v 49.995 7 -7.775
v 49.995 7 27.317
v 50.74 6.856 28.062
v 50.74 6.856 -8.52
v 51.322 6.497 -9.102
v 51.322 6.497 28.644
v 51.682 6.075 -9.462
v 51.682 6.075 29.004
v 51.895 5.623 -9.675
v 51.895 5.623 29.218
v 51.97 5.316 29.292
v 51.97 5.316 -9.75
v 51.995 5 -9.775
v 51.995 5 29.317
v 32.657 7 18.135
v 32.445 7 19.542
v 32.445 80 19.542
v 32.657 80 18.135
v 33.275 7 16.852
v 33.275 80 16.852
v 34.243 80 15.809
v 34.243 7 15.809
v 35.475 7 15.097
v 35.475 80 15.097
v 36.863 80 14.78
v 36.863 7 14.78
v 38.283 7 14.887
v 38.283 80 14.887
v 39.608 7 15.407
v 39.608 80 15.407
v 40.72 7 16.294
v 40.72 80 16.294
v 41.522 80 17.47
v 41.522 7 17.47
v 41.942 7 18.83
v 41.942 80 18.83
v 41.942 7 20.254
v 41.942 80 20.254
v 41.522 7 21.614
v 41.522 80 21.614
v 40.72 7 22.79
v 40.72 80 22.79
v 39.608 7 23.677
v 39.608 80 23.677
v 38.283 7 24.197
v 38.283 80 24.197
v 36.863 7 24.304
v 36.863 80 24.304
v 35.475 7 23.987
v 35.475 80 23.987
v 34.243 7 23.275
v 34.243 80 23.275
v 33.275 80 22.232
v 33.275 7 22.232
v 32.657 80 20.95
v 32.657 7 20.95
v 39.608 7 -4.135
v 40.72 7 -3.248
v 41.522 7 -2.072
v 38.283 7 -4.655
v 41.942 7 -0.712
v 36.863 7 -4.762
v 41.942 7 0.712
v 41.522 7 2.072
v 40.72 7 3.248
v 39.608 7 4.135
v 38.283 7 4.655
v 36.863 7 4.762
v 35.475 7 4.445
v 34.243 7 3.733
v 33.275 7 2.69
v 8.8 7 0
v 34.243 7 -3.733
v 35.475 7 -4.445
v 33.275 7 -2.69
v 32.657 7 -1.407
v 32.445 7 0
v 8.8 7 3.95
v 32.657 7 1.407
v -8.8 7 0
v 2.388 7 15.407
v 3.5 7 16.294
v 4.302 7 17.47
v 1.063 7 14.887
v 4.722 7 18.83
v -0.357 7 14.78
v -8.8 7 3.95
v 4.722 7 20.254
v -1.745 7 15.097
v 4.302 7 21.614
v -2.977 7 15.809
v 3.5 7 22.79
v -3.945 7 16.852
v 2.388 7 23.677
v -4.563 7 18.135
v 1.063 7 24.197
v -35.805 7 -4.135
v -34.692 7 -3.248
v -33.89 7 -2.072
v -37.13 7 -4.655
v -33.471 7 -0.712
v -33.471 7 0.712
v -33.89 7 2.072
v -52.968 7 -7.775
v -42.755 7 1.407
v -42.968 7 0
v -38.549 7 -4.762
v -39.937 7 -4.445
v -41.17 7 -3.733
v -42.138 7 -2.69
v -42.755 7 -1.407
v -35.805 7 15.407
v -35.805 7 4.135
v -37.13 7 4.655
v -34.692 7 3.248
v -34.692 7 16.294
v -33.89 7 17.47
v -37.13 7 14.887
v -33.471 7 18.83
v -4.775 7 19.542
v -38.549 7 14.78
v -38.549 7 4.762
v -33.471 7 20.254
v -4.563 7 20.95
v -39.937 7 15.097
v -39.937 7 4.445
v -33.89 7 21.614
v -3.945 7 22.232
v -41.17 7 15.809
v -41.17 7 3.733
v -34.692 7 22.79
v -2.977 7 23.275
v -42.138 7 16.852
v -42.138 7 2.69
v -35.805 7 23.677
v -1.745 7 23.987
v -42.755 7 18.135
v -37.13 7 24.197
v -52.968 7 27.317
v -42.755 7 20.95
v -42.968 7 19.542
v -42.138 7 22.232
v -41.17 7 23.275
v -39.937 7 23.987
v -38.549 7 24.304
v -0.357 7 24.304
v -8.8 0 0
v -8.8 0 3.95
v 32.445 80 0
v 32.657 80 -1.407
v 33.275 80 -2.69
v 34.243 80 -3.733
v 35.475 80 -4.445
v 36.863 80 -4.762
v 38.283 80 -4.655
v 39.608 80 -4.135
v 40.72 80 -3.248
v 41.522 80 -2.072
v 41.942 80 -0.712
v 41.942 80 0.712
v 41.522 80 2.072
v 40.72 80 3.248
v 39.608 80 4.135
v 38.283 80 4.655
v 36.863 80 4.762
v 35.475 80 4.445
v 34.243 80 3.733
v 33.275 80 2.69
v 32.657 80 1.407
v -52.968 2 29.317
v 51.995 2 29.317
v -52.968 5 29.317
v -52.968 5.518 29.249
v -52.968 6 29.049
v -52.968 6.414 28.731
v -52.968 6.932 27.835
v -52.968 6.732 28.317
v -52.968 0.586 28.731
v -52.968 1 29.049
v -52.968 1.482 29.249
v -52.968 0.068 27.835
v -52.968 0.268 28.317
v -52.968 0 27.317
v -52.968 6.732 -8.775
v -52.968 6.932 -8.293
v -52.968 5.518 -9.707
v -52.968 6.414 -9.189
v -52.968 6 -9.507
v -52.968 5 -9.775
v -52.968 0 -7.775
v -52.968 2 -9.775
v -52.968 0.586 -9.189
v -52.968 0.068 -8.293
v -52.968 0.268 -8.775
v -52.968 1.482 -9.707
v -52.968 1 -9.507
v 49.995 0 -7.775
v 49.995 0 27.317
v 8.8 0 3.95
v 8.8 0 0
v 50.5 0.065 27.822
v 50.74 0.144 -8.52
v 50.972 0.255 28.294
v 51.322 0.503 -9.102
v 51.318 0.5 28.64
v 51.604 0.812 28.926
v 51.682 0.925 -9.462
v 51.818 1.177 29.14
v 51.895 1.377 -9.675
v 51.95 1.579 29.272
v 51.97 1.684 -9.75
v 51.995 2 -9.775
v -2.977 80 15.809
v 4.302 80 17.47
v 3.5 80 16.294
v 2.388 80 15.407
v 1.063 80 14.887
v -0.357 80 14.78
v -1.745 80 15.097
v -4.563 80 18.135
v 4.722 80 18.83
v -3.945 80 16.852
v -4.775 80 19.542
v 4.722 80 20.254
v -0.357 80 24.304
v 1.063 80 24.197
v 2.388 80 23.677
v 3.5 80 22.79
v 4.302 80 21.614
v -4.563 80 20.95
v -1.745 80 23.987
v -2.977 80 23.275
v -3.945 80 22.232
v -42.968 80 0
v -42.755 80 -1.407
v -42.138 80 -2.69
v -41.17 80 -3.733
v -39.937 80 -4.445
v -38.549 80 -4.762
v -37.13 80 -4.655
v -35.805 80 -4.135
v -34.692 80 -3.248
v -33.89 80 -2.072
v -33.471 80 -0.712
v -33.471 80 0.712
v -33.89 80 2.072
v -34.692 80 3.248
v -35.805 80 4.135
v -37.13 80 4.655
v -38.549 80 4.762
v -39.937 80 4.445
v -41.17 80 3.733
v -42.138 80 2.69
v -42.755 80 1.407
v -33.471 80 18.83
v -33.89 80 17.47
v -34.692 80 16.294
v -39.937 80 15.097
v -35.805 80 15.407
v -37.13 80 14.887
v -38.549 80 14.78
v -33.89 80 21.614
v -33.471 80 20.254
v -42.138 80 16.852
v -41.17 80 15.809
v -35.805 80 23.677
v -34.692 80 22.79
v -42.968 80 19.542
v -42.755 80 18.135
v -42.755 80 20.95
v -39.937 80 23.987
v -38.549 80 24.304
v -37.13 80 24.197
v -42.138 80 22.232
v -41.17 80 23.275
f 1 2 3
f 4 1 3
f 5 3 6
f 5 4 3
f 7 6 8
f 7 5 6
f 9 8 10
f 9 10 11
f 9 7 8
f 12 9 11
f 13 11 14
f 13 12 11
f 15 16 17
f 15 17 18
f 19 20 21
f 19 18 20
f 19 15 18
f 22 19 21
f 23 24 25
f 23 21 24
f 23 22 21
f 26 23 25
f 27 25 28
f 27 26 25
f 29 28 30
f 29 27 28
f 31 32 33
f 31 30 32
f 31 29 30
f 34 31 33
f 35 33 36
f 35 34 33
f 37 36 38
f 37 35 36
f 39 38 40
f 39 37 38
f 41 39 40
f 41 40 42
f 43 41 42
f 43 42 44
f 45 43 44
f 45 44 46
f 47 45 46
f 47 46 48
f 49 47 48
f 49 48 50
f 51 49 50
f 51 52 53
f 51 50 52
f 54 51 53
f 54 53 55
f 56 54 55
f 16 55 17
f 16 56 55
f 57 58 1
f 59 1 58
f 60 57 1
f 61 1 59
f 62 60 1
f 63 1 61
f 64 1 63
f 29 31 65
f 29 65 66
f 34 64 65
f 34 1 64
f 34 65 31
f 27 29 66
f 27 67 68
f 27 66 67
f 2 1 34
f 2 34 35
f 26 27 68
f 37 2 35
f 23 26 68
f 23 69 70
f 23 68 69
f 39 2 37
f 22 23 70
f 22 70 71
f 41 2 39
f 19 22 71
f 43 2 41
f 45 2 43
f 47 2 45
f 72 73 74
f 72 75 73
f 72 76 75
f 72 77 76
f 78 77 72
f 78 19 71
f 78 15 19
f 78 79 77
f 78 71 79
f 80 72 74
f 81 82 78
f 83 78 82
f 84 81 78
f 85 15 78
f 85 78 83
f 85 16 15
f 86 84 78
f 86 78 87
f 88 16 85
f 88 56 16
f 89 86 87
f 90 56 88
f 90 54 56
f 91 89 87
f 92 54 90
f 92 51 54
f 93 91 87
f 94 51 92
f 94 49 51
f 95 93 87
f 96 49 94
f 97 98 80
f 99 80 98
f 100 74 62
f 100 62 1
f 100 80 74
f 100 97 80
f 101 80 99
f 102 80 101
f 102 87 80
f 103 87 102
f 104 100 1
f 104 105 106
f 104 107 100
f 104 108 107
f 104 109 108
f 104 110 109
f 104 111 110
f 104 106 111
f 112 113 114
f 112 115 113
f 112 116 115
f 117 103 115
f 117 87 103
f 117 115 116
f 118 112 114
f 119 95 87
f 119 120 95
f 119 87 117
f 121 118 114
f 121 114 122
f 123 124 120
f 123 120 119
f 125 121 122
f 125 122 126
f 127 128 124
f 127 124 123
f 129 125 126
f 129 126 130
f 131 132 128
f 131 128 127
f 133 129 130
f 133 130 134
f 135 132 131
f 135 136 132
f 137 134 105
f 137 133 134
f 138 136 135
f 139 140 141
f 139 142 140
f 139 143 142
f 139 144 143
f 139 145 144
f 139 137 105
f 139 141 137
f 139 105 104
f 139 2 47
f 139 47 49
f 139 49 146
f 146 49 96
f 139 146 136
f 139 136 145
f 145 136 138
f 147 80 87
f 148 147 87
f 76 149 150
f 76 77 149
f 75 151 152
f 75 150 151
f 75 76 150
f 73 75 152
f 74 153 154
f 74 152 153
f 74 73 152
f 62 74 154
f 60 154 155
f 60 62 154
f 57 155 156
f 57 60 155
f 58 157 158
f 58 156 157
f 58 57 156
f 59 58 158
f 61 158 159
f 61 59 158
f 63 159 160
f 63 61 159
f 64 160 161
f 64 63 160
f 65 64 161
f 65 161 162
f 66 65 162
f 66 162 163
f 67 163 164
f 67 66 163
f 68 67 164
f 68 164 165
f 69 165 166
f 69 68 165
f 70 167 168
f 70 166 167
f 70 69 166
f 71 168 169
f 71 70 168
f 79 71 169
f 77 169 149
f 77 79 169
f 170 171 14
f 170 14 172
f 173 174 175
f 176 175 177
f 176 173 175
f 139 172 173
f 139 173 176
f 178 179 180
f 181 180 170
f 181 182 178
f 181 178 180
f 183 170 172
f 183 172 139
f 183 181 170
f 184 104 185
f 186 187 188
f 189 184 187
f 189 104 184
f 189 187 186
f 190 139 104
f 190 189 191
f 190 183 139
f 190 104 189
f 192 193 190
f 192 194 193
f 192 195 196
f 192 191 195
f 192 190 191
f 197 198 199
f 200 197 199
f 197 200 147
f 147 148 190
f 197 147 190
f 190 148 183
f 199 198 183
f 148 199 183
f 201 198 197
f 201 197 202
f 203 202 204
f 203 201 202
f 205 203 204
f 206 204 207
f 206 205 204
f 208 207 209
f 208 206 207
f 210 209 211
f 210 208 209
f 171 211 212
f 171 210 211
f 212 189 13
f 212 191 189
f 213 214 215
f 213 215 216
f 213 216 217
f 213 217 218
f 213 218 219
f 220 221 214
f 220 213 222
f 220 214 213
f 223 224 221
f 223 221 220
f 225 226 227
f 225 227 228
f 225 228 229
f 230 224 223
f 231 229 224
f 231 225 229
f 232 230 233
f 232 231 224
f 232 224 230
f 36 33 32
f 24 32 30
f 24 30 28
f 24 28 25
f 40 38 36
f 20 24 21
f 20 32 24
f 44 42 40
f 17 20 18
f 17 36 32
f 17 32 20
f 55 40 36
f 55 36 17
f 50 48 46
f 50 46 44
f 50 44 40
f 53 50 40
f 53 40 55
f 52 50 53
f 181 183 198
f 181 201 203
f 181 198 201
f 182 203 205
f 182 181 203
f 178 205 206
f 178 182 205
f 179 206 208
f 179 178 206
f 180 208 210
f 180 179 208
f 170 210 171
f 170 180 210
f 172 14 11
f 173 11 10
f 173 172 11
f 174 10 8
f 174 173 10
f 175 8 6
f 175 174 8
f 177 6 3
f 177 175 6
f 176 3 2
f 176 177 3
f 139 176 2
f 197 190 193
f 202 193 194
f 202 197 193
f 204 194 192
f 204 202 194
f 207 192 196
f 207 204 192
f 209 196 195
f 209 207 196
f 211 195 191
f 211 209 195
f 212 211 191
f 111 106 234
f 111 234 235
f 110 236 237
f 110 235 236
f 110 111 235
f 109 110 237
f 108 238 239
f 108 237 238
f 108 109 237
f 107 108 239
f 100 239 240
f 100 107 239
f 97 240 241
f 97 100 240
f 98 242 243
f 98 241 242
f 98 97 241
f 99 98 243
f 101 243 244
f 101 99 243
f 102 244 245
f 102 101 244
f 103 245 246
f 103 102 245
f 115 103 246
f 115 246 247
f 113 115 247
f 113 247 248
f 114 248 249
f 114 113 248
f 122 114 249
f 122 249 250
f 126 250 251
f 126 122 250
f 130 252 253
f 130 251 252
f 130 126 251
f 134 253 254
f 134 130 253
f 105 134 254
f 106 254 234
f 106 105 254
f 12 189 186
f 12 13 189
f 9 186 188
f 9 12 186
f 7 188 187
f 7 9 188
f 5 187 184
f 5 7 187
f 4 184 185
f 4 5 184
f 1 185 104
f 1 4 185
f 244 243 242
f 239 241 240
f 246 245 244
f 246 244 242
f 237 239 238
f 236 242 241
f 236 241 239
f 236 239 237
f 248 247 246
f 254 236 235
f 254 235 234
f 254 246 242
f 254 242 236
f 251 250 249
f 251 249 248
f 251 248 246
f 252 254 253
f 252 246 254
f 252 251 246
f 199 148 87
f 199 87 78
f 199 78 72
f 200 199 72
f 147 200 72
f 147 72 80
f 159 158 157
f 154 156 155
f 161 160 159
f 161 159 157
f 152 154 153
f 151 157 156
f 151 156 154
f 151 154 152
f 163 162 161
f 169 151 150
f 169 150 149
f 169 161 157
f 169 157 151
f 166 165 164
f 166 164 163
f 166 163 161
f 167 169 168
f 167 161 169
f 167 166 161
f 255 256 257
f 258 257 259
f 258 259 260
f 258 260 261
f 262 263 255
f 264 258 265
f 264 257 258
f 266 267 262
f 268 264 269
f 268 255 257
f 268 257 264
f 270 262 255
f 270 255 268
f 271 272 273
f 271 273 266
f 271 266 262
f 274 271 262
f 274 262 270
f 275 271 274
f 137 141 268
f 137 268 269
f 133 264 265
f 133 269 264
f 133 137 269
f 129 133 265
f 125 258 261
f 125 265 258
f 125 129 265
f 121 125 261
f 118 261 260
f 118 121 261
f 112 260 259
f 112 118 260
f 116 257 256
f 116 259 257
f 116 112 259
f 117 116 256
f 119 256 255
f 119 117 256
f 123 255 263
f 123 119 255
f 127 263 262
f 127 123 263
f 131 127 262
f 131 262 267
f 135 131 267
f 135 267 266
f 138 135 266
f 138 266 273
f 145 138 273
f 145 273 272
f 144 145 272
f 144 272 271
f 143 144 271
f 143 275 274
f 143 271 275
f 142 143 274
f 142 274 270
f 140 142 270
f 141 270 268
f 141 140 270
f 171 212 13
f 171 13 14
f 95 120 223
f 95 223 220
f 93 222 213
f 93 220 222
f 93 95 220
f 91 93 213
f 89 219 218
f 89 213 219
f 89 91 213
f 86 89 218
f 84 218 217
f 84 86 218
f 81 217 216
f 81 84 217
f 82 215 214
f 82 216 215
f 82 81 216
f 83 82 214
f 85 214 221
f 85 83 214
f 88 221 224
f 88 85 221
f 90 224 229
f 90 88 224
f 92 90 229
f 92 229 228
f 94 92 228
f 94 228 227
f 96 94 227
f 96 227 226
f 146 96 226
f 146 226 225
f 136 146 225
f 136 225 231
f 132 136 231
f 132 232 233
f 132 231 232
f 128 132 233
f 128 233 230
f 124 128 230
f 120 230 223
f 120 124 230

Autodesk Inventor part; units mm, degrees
ref_plane "YZ Plane" through (0, 0, 0) normal (1, 0, 0) x (0, 1, 0)
ref_plane "XZ Plane" through (0, 0, 0) normal (0, 1, 0) x (-1, 0, 0)
ref_plane "XY Plane" through (0, 0, 0) normal (0, 0, 1) x (1, 0, 0)
sketch "Sketch1" plane through (0, 0, 0) normal (0, 1, 0) x (-1, 0, 0)
  circle A0 centre (0, 19.5421) radius 4.775
  circle A1 centre (-37.22, 0) radius 4.775
  circle A2 centre (38.1926, 0) radius 4.775
  circle A3 centre (38.1926, 19.5421) radius 4.775
  circle A4 centre (-37.22, 19.5421) radius 4.775
  line L0 (52.9676, 0) -> (52.9676, -4.775)
  line L1 (52.9676, -9.775) -> (-51.995, -9.775)
  line L2 (-51.995, -9.775) -> (-51.995, 24.3171)
  line L3 (-51.995, 24.3171) -> (-51.995, 29.3171)
  line L4 (-51.995, 29.3171) -> (52.9676, 29.3171)
  line L5 (52.9676, 29.3171) -> (52.9676, -9.775)
  line L6 (-8.8, 0) -> (8.8, 0)
  line L7 (8.8, 0) -> (8.8, 3.95)
  line L8 (8.8, 3.95) -> (-8.8, 3.95)
  line L9 (-8.8, 3.95) -> (-8.8, 0)
  point P0 (0, 0)
  point P1 (0, 0)
  dimension "d6" = 9.55
  dimension "d8" = 9.55
  dimension "d10" = 9.55
  dimension "d11" = 9.55
  dimension "d12" = 9.55
  dimension "d24" = 5
  dimension "d26" = 17.6
  dimension "d27" = 3.95
extrude "Extrusion1" add sketch "Sketch1" along normal blind 7
extrude "Extrusion2" add sketch "Sketch1" along normal blind 80 contours A2 | A3
extrude "Extrusion3" add sketch "Sketch1" along normal blind 80 contours A1
extrude "Extrusion4" add sketch "Sketch1" along normal blind 80 contours A4
extrude "Extrusion5" add sketch "Sketch1" along normal blind 80 contours A0
fillet "Fillet1" radius 2 3 edges at (51.995, 7, 9.771) (-0.4863, 7, -9.775) (-0.4863, 7, 29.3171)
fillet "Fillet2" radius 2 3 edges at (-0.4863, 0, 29.3171) (-0.4863, 0, -9.775) (51.995, 0, 9.771)
properties part number "BluetoothBase"
